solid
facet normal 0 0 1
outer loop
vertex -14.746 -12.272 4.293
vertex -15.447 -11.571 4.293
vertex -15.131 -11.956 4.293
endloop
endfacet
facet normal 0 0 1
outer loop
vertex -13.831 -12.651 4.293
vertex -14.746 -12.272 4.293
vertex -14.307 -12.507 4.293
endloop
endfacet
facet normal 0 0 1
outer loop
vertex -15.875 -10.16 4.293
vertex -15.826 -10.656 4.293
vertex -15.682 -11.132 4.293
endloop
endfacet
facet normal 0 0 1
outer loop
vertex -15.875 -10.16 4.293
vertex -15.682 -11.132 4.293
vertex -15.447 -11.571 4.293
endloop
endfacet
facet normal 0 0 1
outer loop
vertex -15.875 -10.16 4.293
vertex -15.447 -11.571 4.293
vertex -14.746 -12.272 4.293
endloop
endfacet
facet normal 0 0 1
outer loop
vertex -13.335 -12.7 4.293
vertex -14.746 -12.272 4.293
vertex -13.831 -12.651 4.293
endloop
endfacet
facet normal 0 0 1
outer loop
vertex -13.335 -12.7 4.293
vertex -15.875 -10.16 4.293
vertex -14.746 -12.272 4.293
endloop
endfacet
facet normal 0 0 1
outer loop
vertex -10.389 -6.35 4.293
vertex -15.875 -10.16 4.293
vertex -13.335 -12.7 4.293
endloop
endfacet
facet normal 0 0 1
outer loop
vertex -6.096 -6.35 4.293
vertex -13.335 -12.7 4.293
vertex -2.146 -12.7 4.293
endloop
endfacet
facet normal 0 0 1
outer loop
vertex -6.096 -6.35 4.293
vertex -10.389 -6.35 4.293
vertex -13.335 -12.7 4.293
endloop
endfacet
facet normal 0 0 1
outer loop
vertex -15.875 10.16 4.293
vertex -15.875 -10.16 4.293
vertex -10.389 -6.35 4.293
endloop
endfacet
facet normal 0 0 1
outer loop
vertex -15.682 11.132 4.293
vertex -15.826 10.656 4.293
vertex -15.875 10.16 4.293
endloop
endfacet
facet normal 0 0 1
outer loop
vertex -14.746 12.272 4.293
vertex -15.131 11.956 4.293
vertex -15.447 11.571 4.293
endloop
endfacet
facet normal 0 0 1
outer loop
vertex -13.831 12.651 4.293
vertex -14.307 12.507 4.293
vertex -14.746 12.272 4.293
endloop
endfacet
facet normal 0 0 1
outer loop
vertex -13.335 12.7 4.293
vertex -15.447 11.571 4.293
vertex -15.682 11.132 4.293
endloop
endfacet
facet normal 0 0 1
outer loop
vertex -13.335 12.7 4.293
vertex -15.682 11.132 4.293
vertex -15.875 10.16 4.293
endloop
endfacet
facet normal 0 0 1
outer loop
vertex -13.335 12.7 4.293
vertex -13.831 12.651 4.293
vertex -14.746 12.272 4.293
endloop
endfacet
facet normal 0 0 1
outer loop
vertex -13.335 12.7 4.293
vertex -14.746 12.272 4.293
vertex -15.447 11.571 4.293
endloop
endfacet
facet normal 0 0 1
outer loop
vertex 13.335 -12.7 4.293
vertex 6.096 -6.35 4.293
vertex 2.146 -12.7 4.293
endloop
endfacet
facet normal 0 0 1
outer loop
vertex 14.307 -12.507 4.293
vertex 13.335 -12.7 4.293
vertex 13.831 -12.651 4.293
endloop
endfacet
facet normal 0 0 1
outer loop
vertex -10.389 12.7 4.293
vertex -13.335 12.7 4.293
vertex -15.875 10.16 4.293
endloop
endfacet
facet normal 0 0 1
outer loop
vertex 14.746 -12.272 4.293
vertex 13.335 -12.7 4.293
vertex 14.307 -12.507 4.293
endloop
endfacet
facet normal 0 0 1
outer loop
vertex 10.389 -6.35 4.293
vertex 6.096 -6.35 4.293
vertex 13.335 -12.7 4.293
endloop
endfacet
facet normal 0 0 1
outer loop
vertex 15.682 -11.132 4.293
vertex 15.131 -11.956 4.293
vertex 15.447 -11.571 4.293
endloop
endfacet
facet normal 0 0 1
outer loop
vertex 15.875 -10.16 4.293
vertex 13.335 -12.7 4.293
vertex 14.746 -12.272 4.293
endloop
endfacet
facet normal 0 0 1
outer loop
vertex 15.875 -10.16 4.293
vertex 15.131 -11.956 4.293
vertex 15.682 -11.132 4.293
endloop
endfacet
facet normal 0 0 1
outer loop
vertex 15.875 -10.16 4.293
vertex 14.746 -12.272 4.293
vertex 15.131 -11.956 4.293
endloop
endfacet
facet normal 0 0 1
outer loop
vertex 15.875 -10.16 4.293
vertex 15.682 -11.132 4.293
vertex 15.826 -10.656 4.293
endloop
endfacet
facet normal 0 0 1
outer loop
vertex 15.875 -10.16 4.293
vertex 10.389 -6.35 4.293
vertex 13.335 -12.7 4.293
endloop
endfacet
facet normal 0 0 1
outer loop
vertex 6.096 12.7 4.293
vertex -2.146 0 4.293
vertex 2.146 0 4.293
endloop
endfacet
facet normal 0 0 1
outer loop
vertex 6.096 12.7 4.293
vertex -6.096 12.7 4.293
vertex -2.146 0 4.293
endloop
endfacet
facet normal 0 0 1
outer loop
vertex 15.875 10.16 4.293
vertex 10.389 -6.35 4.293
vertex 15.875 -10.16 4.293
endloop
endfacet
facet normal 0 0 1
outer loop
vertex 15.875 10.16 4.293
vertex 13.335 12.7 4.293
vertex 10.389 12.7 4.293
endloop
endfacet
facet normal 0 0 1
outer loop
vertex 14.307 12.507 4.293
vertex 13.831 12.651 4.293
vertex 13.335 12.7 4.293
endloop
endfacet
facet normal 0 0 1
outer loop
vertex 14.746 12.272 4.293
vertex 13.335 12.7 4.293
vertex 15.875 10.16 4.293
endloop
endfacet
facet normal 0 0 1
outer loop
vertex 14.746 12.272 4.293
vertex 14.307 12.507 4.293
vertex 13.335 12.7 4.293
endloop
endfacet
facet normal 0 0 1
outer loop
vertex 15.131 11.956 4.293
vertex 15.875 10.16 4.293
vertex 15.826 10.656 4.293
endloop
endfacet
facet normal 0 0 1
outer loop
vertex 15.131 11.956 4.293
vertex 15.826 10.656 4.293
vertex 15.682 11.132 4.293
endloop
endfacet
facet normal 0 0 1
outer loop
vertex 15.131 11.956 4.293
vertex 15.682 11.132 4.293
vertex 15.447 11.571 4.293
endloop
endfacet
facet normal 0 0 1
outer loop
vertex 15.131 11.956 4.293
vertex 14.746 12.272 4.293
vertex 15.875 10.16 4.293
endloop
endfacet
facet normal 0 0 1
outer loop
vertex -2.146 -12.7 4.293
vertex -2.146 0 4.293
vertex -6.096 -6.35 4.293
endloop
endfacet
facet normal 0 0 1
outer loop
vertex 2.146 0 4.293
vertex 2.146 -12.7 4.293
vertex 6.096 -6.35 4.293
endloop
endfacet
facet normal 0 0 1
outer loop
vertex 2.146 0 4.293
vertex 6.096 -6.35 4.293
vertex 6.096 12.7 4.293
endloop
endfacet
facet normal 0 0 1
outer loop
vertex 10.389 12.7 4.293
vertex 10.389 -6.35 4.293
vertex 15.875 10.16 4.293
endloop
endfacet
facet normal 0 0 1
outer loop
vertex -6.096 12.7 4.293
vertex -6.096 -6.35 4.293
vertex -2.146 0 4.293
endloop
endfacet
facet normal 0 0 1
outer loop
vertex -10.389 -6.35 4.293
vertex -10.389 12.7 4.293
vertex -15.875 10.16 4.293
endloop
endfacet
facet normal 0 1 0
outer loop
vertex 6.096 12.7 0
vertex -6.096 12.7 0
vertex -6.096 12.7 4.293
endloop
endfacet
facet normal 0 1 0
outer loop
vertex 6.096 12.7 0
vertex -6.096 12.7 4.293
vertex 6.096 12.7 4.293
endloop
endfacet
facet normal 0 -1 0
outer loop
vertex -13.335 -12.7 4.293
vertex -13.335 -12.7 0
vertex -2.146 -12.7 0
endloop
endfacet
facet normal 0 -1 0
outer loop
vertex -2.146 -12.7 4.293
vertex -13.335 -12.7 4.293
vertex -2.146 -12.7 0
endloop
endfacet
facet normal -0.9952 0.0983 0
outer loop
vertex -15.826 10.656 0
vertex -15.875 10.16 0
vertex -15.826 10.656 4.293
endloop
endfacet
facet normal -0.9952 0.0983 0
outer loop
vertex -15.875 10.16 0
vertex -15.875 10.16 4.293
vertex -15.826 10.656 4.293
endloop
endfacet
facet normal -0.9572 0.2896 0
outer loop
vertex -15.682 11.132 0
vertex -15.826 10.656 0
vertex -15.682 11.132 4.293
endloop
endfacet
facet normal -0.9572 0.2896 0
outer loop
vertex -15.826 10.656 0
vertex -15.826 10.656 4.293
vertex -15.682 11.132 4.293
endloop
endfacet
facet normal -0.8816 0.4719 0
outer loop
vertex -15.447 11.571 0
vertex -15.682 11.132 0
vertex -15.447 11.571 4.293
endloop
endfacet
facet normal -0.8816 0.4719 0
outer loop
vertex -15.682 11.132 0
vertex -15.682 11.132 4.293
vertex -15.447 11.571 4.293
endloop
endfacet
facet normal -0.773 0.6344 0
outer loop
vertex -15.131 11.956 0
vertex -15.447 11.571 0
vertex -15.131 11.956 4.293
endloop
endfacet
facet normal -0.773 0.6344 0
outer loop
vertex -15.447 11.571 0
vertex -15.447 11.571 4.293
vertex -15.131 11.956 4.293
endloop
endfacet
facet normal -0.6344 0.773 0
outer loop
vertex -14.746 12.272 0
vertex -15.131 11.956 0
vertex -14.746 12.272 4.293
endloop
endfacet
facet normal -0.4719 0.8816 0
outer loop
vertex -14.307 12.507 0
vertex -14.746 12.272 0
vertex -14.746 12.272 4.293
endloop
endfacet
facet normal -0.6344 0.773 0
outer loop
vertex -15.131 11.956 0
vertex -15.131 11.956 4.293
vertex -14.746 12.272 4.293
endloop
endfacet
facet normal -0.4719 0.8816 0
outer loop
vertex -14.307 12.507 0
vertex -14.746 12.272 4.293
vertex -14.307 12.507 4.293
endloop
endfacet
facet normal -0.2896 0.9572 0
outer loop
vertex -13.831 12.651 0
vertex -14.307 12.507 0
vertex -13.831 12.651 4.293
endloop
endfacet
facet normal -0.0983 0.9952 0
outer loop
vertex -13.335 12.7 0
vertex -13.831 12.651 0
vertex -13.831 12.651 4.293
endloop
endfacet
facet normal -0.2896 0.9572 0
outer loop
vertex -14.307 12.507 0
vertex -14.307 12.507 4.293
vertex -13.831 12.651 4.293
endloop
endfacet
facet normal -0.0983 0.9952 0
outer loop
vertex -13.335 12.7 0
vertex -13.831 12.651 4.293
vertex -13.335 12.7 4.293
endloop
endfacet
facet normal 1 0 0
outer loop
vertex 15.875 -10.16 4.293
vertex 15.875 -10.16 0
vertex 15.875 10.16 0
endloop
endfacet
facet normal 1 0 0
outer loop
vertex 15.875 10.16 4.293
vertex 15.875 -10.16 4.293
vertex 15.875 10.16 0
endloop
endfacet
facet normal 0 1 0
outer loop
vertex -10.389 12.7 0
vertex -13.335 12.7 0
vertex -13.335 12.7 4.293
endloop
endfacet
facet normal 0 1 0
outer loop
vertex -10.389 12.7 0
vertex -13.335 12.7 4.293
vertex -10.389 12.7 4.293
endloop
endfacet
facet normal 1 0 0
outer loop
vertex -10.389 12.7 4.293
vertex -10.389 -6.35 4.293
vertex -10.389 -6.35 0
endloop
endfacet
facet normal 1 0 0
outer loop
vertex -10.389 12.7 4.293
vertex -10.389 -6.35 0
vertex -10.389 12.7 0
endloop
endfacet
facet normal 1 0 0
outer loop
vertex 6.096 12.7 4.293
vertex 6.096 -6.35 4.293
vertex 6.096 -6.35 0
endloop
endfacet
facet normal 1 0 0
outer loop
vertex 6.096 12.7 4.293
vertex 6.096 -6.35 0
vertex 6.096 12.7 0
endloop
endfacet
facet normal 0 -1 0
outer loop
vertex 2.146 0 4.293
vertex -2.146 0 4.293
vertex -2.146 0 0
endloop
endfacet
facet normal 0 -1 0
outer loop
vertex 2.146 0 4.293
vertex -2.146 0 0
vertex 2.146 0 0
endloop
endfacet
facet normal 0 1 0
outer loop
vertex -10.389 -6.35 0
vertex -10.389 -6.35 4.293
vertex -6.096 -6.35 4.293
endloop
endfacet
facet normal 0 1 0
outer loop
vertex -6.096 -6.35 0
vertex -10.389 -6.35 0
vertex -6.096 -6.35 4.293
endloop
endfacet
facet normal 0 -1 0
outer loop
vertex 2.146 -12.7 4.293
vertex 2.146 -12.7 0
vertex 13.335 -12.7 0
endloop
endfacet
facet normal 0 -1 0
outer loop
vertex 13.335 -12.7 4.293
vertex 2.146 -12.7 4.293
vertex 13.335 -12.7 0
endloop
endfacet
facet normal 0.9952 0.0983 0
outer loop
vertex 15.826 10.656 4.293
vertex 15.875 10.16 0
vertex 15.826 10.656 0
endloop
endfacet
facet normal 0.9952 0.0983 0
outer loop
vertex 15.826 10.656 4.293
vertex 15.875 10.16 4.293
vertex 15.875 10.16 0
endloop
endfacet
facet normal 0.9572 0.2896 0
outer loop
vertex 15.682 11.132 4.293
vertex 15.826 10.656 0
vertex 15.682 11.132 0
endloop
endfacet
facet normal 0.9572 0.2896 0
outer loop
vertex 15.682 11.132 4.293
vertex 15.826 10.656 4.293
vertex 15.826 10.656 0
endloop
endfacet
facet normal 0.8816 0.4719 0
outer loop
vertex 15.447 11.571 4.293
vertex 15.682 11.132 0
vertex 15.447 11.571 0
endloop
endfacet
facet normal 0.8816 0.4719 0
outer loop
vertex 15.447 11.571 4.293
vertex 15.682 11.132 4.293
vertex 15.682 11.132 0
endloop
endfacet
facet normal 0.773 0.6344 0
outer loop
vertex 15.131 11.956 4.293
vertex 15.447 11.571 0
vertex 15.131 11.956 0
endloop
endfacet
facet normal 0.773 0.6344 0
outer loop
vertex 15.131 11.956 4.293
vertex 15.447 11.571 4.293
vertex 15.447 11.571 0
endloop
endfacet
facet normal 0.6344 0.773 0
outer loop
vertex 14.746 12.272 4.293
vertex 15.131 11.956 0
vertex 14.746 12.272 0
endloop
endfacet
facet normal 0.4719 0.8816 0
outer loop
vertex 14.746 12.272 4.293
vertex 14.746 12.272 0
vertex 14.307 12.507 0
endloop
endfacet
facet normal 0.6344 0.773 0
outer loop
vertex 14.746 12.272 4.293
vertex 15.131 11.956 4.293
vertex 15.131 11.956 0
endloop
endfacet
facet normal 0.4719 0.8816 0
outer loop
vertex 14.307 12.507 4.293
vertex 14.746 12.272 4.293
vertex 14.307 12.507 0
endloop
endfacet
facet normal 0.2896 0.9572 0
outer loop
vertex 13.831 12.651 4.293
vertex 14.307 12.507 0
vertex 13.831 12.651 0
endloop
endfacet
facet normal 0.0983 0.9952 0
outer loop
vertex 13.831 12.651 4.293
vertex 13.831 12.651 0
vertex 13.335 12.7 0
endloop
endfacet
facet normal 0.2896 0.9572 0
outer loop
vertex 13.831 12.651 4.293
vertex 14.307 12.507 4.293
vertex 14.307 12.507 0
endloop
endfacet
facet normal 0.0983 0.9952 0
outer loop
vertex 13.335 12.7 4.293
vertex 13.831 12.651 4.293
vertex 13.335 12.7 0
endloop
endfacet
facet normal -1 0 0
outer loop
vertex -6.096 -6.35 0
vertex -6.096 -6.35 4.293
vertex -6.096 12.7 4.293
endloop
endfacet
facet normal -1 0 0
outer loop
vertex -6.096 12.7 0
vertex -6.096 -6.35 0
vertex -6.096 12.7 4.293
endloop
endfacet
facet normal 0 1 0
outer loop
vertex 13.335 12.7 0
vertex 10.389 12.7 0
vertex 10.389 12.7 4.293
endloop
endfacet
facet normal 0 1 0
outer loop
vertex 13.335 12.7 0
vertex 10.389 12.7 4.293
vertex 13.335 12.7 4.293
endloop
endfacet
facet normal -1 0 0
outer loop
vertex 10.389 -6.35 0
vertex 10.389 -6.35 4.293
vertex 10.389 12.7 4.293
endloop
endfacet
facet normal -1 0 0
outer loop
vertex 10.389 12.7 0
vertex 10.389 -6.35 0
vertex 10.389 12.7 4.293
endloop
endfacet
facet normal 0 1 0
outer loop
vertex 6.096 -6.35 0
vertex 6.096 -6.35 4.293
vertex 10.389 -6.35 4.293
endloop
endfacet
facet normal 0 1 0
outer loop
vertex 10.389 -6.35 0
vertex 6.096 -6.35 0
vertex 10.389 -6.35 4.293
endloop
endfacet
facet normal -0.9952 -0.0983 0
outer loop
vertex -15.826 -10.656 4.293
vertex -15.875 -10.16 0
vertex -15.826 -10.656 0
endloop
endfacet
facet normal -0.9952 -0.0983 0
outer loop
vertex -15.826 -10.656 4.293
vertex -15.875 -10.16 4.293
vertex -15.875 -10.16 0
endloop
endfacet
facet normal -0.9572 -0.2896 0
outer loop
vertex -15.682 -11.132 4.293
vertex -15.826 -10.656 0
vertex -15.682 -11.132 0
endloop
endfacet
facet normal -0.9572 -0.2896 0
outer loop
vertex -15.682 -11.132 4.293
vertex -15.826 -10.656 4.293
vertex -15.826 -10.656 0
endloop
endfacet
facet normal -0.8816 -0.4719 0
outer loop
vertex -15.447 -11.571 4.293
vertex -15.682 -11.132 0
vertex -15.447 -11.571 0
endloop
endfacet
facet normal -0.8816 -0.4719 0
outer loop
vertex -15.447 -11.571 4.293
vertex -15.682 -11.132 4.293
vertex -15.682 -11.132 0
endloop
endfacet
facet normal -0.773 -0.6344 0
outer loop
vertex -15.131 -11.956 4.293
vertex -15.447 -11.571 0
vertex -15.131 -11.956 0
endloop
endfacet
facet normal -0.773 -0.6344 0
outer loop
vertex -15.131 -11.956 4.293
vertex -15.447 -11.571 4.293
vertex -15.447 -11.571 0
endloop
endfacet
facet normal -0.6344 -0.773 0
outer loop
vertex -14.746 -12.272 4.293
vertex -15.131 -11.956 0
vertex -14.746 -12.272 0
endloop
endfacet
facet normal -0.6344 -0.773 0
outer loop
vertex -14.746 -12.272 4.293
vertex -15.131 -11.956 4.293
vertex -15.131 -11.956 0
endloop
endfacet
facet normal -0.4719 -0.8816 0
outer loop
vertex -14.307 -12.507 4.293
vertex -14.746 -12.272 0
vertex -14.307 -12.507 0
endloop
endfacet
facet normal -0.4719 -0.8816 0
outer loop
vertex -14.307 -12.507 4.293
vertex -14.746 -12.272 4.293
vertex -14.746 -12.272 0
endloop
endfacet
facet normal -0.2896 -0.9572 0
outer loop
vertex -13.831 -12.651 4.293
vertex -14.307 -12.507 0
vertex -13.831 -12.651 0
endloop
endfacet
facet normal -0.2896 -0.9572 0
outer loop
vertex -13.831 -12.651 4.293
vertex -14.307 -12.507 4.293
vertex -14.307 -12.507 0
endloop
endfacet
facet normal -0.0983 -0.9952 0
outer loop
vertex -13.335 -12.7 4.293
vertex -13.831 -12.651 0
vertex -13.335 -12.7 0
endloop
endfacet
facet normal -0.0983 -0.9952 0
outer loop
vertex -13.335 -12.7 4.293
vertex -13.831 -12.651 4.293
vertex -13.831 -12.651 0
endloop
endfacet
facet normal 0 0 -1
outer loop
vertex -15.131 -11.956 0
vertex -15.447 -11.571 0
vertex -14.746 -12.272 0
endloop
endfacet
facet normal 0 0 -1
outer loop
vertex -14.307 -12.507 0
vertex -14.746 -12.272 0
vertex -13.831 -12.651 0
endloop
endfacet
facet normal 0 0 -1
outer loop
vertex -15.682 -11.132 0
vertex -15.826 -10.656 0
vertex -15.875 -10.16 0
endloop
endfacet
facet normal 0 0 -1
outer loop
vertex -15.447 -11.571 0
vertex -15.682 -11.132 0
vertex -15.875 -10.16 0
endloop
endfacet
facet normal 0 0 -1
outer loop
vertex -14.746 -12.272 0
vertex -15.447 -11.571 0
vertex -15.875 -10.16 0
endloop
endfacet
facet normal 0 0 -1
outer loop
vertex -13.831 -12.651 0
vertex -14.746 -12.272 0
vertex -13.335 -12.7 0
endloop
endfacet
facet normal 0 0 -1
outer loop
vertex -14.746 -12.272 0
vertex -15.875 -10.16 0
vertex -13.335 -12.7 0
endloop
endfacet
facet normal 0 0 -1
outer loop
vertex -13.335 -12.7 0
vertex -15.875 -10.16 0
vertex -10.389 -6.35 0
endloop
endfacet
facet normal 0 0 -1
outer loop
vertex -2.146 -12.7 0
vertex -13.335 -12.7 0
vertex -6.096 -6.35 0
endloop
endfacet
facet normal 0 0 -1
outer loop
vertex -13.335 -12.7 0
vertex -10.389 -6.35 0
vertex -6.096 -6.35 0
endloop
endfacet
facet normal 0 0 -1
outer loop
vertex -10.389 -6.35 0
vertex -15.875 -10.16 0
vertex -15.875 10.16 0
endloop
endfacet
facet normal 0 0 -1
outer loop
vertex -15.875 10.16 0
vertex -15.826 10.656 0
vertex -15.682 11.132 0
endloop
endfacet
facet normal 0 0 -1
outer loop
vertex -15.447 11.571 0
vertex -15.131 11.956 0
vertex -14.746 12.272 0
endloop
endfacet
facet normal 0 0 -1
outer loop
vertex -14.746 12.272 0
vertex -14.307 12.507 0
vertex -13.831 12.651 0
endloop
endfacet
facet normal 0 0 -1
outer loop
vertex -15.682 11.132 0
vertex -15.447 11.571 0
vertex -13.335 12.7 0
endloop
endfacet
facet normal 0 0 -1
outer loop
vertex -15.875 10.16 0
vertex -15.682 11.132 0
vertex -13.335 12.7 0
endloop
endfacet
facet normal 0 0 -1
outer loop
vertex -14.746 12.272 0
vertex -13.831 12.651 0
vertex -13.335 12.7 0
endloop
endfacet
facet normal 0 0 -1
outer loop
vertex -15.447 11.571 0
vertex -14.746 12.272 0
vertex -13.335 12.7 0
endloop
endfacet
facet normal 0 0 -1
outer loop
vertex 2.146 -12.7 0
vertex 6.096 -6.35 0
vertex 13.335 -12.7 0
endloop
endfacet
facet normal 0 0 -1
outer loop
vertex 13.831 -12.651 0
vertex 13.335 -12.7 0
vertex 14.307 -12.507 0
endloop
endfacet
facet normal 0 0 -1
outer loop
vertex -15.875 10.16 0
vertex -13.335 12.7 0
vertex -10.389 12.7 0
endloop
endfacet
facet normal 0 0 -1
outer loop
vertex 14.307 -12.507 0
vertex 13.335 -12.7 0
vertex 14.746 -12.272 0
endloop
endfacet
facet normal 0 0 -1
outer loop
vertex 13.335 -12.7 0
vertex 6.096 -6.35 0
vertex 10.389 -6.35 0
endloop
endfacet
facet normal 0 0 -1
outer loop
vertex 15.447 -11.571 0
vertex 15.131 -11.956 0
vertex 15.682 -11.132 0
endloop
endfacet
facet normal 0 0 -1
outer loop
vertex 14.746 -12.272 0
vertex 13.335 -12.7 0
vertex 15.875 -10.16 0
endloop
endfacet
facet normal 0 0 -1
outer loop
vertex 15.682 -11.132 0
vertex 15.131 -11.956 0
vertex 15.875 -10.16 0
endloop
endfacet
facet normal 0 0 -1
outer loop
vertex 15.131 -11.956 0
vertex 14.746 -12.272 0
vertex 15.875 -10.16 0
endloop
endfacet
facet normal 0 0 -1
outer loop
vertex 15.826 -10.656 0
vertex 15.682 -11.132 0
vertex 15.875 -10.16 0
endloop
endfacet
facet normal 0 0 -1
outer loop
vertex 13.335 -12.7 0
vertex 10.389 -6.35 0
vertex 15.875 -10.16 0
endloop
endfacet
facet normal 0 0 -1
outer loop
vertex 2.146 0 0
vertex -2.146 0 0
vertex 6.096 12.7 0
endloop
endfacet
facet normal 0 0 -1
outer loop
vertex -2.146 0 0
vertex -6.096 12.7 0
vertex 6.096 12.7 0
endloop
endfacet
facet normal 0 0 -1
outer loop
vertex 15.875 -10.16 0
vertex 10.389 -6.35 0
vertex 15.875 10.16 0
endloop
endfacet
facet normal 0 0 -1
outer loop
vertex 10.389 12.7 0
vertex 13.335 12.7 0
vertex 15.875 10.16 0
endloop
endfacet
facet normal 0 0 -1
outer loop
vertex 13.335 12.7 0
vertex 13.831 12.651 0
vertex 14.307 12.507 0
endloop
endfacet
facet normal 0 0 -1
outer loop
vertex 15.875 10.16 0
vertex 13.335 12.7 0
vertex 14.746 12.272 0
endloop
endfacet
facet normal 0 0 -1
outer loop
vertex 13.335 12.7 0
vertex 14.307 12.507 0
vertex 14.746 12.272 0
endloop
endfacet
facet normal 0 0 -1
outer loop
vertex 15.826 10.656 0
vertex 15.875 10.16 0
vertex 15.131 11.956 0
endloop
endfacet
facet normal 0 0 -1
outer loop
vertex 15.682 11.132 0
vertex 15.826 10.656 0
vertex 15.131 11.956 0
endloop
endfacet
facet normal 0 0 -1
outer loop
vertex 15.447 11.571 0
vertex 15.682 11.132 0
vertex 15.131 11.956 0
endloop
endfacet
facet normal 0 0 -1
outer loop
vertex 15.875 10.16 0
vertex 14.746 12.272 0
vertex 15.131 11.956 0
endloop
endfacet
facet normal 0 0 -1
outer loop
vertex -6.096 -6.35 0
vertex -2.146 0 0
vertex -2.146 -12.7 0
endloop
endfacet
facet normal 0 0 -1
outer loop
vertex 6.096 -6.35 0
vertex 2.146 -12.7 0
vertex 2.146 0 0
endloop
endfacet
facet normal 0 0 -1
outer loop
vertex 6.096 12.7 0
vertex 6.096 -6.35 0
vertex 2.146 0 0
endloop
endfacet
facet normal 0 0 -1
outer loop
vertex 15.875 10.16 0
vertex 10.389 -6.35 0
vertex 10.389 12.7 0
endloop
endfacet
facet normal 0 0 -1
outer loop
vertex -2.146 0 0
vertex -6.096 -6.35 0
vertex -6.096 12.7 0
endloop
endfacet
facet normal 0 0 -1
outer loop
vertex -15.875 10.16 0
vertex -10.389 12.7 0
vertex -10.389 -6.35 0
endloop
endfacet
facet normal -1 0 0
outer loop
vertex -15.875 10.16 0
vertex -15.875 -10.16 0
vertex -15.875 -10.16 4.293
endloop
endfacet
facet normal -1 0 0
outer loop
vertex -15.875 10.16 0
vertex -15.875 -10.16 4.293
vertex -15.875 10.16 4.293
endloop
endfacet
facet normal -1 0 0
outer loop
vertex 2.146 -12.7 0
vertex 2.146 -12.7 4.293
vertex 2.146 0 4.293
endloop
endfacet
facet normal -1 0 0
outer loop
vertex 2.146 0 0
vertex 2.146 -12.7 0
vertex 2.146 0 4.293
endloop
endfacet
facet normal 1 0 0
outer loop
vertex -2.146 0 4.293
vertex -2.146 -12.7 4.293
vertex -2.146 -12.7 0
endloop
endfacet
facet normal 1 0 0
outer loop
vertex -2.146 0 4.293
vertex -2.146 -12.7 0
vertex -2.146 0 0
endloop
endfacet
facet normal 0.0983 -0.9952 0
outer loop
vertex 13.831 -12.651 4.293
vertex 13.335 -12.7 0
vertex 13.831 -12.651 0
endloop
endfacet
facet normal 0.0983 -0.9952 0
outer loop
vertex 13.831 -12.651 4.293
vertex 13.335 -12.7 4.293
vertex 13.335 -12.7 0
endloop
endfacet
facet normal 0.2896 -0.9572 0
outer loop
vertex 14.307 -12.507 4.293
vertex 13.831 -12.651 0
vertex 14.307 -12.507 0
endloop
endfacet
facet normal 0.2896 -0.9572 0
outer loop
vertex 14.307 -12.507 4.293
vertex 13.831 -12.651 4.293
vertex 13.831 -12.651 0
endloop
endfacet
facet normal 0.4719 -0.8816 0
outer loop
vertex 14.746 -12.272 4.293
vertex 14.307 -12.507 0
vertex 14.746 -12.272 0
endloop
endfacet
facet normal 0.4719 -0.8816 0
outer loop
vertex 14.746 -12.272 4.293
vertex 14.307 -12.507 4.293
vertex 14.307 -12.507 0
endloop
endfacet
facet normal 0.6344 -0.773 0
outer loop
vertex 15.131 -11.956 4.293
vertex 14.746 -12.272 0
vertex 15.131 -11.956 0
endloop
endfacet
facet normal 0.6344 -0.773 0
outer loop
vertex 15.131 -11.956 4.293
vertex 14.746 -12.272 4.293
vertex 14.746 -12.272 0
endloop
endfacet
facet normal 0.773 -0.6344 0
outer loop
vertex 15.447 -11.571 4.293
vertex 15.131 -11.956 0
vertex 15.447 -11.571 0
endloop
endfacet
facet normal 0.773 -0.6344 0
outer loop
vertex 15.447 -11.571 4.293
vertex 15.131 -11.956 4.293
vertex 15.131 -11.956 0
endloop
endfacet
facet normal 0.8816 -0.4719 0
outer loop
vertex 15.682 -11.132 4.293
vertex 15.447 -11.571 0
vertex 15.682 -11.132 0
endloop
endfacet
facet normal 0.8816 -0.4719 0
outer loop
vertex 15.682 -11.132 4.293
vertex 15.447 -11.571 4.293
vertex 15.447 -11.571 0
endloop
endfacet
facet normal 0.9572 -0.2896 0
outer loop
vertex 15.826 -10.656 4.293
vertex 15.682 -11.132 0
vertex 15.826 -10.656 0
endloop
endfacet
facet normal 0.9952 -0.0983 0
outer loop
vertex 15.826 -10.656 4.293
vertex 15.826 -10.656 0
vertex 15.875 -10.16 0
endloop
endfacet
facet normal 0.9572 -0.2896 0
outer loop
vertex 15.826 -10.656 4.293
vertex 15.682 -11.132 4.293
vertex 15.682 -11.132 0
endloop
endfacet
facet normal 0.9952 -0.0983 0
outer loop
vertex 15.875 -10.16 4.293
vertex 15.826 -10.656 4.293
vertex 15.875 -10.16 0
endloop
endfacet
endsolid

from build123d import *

# Parameters (mm, degrees)
SKETCH1_W           = 31.75
SKETCH1_H           = 25.4
BOSS_EXTRUDE1_DEPTH = 4.2926
FILLET1_R           = 2.54
SKETCH2_W           = 4.2926
SKETCH2_H           = 19.05
SKETCH2_H_2         = 12.7
CUT_EXTRUDE2_DEPTH  = 4.2926


with BuildPart() as part:
    # Sketch1 → Boss-Extrude1 (new body)
    with BuildSketch(Plane.XY):
        Rectangle(SKETCH1_W, SKETCH1_H)
    extrude(amount=BOSS_EXTRUDE1_DEPTH)

    # Fillet1
    fillet1_edges = [part.edges().sort_by_distance(p)[0] for p in [
        (15.875, -12.7, 2.1463),
        (-15.875, -12.7, 2.1463),
        (-15.875, 12.7, 2.1463),
        (15.875, 12.7, 2.1463),
    ]]
    fillet(fillet1_edges, radius=FILLET1_R)

    # Sketch2 → Cut-Extrude2 (cut)
    with BuildSketch(Plane.XY.offset(4.2926)):
        with Locations((-8.2423, 3.175)):
            Rectangle(SKETCH2_W, SKETCH2_H)
        with Locations((8.2423, 3.175)):
            Rectangle(SKETCH2_W, SKETCH2_H)
        with Locations((0, -6.35)):
            Rectangle(SKETCH2_W, SKETCH2_H_2)
    extrude(amount=-CUT_EXTRUDE2_DEPTH, mode=Mode.SUBTRACT)


solid = part.part
